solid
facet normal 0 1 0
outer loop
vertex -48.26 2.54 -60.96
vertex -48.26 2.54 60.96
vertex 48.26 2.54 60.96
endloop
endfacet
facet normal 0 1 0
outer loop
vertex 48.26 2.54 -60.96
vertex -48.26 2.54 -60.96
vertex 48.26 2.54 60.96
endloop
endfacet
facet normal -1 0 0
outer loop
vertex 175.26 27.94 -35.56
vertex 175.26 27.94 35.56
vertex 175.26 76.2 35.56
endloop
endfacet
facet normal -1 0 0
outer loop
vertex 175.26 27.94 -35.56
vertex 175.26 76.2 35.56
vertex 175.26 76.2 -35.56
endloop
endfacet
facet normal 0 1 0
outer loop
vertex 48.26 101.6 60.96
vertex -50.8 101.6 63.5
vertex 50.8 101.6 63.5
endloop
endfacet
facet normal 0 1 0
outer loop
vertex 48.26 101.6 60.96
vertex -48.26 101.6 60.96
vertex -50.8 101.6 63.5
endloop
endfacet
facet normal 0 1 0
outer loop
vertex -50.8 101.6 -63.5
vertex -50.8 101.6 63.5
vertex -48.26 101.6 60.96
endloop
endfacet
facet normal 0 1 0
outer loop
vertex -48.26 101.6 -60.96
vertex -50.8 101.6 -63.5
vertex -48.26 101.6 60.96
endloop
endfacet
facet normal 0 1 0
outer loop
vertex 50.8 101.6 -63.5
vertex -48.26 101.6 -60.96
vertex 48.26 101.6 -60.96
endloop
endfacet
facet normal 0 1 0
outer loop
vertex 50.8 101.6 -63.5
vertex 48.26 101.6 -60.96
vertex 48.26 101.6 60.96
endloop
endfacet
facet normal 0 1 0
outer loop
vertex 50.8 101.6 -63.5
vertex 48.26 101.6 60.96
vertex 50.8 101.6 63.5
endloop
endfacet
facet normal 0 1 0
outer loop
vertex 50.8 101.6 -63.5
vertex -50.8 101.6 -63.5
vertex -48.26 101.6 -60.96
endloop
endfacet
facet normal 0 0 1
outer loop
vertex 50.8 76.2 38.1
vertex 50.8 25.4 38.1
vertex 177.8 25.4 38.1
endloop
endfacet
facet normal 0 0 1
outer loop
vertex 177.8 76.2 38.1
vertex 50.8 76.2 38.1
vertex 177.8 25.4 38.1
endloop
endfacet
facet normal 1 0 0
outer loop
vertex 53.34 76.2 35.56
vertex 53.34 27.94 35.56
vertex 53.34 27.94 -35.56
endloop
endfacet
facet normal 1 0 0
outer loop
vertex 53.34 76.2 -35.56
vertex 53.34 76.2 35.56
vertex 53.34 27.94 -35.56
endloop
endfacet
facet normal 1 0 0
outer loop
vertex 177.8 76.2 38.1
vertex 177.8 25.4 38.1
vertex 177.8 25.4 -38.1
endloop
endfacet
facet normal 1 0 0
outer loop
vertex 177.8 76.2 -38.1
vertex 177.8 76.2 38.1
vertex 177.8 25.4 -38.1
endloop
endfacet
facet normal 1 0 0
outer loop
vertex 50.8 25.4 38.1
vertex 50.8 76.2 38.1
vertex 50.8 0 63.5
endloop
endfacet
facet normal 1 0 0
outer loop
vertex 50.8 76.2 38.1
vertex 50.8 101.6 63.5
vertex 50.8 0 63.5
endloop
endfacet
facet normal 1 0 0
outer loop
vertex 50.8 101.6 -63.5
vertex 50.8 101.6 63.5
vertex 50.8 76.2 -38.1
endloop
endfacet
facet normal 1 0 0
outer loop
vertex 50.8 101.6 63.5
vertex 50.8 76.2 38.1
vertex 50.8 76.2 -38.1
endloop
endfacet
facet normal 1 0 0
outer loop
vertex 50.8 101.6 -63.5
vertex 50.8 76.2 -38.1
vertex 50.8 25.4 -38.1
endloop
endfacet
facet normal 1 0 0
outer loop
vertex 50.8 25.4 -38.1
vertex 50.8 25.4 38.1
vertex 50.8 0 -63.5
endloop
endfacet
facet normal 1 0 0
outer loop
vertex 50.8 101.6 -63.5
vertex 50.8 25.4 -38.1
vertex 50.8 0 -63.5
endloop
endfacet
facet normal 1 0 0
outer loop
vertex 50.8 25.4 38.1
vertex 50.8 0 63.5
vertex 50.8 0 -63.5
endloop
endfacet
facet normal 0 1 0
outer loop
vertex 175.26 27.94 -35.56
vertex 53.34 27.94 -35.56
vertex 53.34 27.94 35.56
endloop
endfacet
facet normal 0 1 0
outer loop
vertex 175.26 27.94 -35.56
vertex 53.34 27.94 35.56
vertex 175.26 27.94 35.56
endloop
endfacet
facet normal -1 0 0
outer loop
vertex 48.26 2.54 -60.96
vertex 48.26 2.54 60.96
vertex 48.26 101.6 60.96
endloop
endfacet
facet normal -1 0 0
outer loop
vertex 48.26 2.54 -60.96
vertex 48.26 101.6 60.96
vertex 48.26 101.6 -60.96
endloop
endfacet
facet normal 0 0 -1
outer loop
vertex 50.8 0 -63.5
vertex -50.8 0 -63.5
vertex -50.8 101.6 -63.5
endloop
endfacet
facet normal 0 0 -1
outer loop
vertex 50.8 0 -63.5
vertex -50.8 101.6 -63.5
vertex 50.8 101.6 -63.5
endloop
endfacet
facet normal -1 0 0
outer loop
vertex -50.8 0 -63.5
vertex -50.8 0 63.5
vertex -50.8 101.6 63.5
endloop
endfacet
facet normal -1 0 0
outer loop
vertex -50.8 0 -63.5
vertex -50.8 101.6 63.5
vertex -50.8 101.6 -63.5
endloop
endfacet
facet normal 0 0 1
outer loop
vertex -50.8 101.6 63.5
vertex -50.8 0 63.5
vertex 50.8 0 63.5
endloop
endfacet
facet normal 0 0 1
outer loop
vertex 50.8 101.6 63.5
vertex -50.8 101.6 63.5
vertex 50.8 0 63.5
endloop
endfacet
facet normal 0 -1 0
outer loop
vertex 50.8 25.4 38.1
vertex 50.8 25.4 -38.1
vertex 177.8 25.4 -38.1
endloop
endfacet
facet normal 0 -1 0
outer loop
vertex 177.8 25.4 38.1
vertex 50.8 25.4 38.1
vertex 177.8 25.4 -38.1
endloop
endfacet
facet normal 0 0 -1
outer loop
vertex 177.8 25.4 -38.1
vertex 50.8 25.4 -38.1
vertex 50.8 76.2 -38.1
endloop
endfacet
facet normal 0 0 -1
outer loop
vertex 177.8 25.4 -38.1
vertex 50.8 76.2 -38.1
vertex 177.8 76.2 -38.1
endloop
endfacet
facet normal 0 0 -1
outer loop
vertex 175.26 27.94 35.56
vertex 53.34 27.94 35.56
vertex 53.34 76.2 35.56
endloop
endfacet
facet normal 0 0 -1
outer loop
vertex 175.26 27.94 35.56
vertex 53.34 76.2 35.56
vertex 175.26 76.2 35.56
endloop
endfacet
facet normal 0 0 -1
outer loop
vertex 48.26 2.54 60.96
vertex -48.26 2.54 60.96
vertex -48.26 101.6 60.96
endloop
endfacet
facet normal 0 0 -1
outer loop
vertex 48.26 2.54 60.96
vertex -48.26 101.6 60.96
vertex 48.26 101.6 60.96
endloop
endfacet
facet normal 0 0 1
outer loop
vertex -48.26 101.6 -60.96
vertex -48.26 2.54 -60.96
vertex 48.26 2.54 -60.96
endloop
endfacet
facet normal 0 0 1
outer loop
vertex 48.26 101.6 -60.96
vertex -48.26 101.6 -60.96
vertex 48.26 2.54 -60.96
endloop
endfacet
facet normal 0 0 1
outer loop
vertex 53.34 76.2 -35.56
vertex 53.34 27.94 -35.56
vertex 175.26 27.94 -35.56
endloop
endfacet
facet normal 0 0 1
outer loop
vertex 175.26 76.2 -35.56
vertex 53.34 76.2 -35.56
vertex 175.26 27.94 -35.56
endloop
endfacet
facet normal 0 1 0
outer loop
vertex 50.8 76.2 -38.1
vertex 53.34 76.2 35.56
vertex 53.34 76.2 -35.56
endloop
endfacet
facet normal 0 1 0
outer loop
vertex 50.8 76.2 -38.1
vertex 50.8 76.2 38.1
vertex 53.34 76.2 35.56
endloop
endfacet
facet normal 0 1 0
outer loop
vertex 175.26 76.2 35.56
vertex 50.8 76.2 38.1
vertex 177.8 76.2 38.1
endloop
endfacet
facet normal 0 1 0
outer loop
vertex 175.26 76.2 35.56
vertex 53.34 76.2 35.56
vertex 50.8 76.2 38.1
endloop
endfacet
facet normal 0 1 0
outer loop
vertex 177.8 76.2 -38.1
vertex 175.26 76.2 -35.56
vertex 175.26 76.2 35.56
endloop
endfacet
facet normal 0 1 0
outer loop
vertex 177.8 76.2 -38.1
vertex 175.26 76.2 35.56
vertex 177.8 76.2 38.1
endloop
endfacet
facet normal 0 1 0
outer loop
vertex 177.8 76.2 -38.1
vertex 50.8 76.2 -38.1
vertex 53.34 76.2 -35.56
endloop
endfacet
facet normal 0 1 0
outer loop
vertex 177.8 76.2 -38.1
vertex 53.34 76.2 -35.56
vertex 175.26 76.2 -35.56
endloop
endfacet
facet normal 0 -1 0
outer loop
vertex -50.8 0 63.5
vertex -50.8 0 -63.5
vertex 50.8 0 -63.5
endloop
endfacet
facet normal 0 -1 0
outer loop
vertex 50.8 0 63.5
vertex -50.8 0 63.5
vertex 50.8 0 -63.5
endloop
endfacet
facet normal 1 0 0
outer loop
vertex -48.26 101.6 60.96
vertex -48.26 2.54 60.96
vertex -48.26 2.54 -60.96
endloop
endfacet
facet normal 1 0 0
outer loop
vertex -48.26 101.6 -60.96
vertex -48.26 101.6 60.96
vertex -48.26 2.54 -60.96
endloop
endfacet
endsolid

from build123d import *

# Parameters (mm, degrees)
SKETCH1_W           = 101.6
SKETCH1_H           = 127
SKETCH1_W_2         = 96.52
SKETCH1_H_2         = 121.92
EXTRUDE_THIN1_DEPTH = 101.6
SKETCH1_2_W         = 101.6
SKETCH1_2_H         = 127
BOSS_EXTRUDE1_DEPTH = 2.54
SKETCH2_W           = 127
SKETCH2_H           = 76.2
SKETCH2_W_2         = 121.92
SKETCH2_H_2         = 71.12
EXTRUDE_THIN2_DEPTH = 50.8
SKETCH2_2_W         = 127
SKETCH2_2_H         = 76.2
BOSS_EXTRUDE2_DEPTH = 2.54


with BuildPart() as part:
    # Sketch1 → Extrude-Thin1 (new body)
    with BuildSketch(Plane(origin=(0, 0, 0), x_dir=(1, 0, 0), z_dir=(0, 1, 0))):
        Rectangle(SKETCH1_W, SKETCH1_H)
        Rectangle(SKETCH1_W_2, SKETCH1_H_2, mode=Mode.SUBTRACT)
    extrude(amount=EXTRUDE_THIN1_DEPTH)

    # Sketch1<2> → Boss-Extrude1 (add)
    with BuildSketch(Plane(origin=(0, 0, 0), x_dir=(1, 0, 0), z_dir=(0, 1, 0))):
        Rectangle(SKETCH1_2_W, SKETCH1_2_H)
    extrude(amount=BOSS_EXTRUDE1_DEPTH)

    # Sketch2 → Extrude-Thin2 (add)
    with BuildSketch(Plane(origin=(0, 25.4, 0), x_dir=(1, 0, 0), z_dir=(0, 1, 0))):
        with Locations((114.3, 0)):
            Rectangle(SKETCH2_W, SKETCH2_H)
        with Locations((114.3, 0)):
            Rectangle(SKETCH2_W_2, SKETCH2_H_2, mode=Mode.SUBTRACT)
    extrude(amount=EXTRUDE_THIN2_DEPTH)

    # Sketch2<2> → Boss-Extrude2 (add)
    with BuildSketch(Plane(origin=(0, 25.4, 0), x_dir=(1, 0, 0), z_dir=(0, 1, 0))):
        with Locations((114.3, 0)):
            Rectangle(SKETCH2_2_W, SKETCH2_2_H)
    extrude(amount=BOSS_EXTRUDE2_DEPTH)


solid = part.part
